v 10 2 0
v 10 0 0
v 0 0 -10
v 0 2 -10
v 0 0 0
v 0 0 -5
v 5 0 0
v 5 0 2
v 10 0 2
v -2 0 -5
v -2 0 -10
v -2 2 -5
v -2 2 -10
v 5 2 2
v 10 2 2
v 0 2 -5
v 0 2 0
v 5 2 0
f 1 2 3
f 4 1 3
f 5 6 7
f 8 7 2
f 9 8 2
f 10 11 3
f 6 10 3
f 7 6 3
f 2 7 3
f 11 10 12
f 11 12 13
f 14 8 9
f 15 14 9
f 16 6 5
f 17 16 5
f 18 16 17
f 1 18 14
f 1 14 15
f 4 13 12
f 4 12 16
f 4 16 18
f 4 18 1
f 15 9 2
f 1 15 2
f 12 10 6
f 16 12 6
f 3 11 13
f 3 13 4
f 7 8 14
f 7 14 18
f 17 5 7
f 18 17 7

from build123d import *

# Parameters (mm, degrees)
SKETCH1_W           = 2
SKETCH1_H           = 5
SKETCH1_W_2         = 5
SKETCH1_H_2         = 2
BOSS_EXTRUDE1_DEPTH = 2


with BuildPart() as part:
    # Sketch1 → Boss-Extrude1 (new body)
    with BuildSketch(Plane(origin=(0, 0, 0), x_dir=(1, 0, 0), z_dir=(0, 1, 0))):
        Polygon((10, 0), (0, 10), (0, 0), align=None)
        with Locations((-1, 7.5)):
            Rectangle(SKETCH1_W, SKETCH1_H)
        with Locations((7.5, -1)):
            Rectangle(SKETCH1_W_2, SKETCH1_H_2)
    extrude(amount=BOSS_EXTRUDE1_DEPTH)


solid = part.part
